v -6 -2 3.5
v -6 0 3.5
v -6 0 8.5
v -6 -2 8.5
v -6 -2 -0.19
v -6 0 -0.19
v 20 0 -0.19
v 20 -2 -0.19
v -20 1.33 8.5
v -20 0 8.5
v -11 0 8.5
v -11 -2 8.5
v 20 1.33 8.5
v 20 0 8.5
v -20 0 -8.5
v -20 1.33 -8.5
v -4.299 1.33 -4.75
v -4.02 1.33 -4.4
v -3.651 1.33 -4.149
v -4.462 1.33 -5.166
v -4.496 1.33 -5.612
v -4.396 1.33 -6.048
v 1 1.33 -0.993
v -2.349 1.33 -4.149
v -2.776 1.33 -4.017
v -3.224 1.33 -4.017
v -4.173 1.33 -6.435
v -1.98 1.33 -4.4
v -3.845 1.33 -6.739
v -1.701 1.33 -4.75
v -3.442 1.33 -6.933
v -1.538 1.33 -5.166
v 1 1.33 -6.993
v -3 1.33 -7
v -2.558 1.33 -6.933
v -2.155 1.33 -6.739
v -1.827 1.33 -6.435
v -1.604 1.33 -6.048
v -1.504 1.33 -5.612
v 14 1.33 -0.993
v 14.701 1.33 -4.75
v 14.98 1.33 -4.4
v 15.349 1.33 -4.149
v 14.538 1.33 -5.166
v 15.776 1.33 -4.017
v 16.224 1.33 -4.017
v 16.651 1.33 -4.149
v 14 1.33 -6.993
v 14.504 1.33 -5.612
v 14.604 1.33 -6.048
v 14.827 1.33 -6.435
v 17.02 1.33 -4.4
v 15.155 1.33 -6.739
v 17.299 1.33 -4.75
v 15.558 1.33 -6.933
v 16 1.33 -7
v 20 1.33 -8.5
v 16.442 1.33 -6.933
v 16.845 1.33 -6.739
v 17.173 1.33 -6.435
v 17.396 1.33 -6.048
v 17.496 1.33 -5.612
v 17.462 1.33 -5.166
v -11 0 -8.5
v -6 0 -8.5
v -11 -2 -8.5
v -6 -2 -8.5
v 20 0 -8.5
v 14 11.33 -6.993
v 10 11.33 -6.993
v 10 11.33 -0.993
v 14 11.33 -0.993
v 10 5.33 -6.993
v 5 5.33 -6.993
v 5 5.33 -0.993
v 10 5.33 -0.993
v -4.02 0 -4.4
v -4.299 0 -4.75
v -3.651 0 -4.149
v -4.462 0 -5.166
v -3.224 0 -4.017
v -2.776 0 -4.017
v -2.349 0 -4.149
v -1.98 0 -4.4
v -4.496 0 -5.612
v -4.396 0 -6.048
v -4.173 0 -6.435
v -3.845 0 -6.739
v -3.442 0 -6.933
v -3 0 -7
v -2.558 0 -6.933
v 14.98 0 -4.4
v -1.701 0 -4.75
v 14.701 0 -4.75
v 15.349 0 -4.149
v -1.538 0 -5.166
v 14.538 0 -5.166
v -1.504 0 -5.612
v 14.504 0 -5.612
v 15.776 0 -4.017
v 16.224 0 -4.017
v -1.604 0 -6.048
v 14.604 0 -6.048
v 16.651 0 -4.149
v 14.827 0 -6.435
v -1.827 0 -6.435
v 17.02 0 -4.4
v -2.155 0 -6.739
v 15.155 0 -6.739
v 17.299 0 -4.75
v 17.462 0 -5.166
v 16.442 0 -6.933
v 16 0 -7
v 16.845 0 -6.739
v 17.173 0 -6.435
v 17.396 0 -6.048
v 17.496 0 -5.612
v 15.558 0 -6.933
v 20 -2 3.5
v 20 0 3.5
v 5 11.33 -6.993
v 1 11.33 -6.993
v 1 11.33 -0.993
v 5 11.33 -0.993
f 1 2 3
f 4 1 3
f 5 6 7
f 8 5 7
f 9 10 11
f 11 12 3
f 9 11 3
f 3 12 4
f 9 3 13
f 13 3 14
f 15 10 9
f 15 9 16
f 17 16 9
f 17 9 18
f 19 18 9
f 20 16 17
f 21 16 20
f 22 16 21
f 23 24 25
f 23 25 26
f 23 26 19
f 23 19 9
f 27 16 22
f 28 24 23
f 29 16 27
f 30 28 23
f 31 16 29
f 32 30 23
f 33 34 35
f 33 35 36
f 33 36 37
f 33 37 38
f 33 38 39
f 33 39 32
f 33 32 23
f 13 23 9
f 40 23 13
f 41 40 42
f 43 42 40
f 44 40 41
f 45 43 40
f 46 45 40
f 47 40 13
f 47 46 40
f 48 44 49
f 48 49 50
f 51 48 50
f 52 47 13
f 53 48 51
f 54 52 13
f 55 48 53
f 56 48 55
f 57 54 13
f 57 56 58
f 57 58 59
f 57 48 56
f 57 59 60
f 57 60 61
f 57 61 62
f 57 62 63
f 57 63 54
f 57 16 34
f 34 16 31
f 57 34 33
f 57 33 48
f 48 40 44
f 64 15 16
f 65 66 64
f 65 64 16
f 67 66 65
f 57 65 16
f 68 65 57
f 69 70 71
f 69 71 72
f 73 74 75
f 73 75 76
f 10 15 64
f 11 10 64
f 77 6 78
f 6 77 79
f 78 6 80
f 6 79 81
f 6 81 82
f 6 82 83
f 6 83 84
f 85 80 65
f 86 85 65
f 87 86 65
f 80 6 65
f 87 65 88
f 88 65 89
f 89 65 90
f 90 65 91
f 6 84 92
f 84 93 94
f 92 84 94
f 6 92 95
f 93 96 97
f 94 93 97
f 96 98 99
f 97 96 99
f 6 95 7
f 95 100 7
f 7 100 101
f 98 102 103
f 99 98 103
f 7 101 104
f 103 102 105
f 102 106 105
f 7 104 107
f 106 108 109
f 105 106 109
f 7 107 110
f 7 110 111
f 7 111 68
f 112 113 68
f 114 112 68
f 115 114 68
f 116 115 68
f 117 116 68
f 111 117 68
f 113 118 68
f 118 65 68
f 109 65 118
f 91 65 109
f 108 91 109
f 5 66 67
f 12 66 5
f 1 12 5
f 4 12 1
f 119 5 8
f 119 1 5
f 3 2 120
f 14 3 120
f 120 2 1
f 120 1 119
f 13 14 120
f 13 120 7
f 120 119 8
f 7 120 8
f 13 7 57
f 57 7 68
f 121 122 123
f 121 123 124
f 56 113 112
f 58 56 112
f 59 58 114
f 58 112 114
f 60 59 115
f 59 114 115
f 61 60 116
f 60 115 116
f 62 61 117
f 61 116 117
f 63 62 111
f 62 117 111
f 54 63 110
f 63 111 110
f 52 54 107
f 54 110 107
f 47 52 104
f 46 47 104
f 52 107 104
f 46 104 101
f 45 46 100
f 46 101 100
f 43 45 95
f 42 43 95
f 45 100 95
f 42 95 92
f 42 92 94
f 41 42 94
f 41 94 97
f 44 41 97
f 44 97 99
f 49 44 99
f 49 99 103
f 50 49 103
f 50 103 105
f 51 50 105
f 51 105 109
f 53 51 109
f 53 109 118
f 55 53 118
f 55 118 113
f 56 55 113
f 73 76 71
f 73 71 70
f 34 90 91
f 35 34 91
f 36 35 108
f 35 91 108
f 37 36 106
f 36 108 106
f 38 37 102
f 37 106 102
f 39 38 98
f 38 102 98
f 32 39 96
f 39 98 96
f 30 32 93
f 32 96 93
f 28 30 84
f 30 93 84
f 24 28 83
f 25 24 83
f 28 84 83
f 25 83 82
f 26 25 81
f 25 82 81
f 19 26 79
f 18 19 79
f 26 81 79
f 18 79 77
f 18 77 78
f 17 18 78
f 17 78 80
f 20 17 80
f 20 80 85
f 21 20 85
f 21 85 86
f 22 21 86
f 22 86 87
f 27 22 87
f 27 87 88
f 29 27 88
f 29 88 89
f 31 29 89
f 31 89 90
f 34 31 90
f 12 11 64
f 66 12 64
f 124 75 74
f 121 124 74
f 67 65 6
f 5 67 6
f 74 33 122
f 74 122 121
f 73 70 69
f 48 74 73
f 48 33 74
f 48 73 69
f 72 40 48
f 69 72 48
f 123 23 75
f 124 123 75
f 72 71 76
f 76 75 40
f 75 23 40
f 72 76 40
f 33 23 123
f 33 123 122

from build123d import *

# Parameters (mm, degrees)
SKETCH_1_W          = 40
SKETCH_1_H          = 17
EXTRUDE_1_DEPTH     = 1.33
SKETCH_3_W          = 26
SKETCH_3_H          = 3.69
EXTRUDE_3_DEPTH     = 2
SKETCH_4_R          = 1.5
CUT_EXTRUDE_1_DEPTH = 22.823152843
SKETCH_2_W          = 4
SKETCH_2_H          = 6
EXTRUDE_4_DEPTH     = 10
SKETCH_5_W          = 5
SKETCH_5_H          = 6
EXTRUDE_5_DEPTH     = 4


with BuildPart() as part:
    # Эскиз1 → Бобышка-Вытянуть1 (new body)
    with BuildSketch(Plane(origin=(0, 0, 0), x_dir=(1, 0, 0), z_dir=(0, 1, 0))):
        Rectangle(SKETCH_1_W, SKETCH_1_H)
    extrude(amount=EXTRUDE_1_DEPTH)

    # Эскиз3 → Бобышка-Вытянуть3 (add)
    with BuildSketch(Plane.XZ):
        Polygon((-11, -8.5), (-6, -8.5), (-6, -0.19), (-6, 3.5), (-6, 8.5), (-11, 8.5), align=None)
        with Locations((7, 1.655)):
            Rectangle(SKETCH_3_W, SKETCH_3_H)
    extrude(amount=EXTRUDE_3_DEPTH)

    # Эскиз4 → Вырез-Вытянуть1 (cut, through all)
    with BuildSketch(Plane.XZ):
        with Locations(Location((16, -5.5, 0), (0, 0, 270))):
            Circle(SKETCH_4_R)
        with Locations(Location((-3, -5.5, 0), (0, 0, 270))):
            Circle(SKETCH_4_R)
    extrude(amount=-CUT_EXTRUDE_1_DEPTH, mode=Mode.SUBTRACT)

    # Эскиз2 → Бобышка-Вытянуть4 (add)
    with BuildSketch(Plane(origin=(0, 1.33, 0), x_dir=(1, 0, 0), z_dir=(0, 1, 0))):
        with Locations((12, 3.992967771)):
            Rectangle(SKETCH_2_W, SKETCH_2_H)
        with Locations((3, 3.992967771)):
            Rectangle(SKETCH_2_W, SKETCH_2_H)
    extrude(amount=EXTRUDE_4_DEPTH)

    # Эскиз5 → Бобышка-Вытянуть5 (add)
    with BuildSketch(Plane(origin=(0, 1.33, 0), x_dir=(1, 0, 0), z_dir=(0, 1, 0))):
        with Locations((7.5, 3.992967771)):
            Rectangle(SKETCH_5_W, SKETCH_5_H)
    extrude(amount=EXTRUDE_5_DEPTH)


solid = part.part
